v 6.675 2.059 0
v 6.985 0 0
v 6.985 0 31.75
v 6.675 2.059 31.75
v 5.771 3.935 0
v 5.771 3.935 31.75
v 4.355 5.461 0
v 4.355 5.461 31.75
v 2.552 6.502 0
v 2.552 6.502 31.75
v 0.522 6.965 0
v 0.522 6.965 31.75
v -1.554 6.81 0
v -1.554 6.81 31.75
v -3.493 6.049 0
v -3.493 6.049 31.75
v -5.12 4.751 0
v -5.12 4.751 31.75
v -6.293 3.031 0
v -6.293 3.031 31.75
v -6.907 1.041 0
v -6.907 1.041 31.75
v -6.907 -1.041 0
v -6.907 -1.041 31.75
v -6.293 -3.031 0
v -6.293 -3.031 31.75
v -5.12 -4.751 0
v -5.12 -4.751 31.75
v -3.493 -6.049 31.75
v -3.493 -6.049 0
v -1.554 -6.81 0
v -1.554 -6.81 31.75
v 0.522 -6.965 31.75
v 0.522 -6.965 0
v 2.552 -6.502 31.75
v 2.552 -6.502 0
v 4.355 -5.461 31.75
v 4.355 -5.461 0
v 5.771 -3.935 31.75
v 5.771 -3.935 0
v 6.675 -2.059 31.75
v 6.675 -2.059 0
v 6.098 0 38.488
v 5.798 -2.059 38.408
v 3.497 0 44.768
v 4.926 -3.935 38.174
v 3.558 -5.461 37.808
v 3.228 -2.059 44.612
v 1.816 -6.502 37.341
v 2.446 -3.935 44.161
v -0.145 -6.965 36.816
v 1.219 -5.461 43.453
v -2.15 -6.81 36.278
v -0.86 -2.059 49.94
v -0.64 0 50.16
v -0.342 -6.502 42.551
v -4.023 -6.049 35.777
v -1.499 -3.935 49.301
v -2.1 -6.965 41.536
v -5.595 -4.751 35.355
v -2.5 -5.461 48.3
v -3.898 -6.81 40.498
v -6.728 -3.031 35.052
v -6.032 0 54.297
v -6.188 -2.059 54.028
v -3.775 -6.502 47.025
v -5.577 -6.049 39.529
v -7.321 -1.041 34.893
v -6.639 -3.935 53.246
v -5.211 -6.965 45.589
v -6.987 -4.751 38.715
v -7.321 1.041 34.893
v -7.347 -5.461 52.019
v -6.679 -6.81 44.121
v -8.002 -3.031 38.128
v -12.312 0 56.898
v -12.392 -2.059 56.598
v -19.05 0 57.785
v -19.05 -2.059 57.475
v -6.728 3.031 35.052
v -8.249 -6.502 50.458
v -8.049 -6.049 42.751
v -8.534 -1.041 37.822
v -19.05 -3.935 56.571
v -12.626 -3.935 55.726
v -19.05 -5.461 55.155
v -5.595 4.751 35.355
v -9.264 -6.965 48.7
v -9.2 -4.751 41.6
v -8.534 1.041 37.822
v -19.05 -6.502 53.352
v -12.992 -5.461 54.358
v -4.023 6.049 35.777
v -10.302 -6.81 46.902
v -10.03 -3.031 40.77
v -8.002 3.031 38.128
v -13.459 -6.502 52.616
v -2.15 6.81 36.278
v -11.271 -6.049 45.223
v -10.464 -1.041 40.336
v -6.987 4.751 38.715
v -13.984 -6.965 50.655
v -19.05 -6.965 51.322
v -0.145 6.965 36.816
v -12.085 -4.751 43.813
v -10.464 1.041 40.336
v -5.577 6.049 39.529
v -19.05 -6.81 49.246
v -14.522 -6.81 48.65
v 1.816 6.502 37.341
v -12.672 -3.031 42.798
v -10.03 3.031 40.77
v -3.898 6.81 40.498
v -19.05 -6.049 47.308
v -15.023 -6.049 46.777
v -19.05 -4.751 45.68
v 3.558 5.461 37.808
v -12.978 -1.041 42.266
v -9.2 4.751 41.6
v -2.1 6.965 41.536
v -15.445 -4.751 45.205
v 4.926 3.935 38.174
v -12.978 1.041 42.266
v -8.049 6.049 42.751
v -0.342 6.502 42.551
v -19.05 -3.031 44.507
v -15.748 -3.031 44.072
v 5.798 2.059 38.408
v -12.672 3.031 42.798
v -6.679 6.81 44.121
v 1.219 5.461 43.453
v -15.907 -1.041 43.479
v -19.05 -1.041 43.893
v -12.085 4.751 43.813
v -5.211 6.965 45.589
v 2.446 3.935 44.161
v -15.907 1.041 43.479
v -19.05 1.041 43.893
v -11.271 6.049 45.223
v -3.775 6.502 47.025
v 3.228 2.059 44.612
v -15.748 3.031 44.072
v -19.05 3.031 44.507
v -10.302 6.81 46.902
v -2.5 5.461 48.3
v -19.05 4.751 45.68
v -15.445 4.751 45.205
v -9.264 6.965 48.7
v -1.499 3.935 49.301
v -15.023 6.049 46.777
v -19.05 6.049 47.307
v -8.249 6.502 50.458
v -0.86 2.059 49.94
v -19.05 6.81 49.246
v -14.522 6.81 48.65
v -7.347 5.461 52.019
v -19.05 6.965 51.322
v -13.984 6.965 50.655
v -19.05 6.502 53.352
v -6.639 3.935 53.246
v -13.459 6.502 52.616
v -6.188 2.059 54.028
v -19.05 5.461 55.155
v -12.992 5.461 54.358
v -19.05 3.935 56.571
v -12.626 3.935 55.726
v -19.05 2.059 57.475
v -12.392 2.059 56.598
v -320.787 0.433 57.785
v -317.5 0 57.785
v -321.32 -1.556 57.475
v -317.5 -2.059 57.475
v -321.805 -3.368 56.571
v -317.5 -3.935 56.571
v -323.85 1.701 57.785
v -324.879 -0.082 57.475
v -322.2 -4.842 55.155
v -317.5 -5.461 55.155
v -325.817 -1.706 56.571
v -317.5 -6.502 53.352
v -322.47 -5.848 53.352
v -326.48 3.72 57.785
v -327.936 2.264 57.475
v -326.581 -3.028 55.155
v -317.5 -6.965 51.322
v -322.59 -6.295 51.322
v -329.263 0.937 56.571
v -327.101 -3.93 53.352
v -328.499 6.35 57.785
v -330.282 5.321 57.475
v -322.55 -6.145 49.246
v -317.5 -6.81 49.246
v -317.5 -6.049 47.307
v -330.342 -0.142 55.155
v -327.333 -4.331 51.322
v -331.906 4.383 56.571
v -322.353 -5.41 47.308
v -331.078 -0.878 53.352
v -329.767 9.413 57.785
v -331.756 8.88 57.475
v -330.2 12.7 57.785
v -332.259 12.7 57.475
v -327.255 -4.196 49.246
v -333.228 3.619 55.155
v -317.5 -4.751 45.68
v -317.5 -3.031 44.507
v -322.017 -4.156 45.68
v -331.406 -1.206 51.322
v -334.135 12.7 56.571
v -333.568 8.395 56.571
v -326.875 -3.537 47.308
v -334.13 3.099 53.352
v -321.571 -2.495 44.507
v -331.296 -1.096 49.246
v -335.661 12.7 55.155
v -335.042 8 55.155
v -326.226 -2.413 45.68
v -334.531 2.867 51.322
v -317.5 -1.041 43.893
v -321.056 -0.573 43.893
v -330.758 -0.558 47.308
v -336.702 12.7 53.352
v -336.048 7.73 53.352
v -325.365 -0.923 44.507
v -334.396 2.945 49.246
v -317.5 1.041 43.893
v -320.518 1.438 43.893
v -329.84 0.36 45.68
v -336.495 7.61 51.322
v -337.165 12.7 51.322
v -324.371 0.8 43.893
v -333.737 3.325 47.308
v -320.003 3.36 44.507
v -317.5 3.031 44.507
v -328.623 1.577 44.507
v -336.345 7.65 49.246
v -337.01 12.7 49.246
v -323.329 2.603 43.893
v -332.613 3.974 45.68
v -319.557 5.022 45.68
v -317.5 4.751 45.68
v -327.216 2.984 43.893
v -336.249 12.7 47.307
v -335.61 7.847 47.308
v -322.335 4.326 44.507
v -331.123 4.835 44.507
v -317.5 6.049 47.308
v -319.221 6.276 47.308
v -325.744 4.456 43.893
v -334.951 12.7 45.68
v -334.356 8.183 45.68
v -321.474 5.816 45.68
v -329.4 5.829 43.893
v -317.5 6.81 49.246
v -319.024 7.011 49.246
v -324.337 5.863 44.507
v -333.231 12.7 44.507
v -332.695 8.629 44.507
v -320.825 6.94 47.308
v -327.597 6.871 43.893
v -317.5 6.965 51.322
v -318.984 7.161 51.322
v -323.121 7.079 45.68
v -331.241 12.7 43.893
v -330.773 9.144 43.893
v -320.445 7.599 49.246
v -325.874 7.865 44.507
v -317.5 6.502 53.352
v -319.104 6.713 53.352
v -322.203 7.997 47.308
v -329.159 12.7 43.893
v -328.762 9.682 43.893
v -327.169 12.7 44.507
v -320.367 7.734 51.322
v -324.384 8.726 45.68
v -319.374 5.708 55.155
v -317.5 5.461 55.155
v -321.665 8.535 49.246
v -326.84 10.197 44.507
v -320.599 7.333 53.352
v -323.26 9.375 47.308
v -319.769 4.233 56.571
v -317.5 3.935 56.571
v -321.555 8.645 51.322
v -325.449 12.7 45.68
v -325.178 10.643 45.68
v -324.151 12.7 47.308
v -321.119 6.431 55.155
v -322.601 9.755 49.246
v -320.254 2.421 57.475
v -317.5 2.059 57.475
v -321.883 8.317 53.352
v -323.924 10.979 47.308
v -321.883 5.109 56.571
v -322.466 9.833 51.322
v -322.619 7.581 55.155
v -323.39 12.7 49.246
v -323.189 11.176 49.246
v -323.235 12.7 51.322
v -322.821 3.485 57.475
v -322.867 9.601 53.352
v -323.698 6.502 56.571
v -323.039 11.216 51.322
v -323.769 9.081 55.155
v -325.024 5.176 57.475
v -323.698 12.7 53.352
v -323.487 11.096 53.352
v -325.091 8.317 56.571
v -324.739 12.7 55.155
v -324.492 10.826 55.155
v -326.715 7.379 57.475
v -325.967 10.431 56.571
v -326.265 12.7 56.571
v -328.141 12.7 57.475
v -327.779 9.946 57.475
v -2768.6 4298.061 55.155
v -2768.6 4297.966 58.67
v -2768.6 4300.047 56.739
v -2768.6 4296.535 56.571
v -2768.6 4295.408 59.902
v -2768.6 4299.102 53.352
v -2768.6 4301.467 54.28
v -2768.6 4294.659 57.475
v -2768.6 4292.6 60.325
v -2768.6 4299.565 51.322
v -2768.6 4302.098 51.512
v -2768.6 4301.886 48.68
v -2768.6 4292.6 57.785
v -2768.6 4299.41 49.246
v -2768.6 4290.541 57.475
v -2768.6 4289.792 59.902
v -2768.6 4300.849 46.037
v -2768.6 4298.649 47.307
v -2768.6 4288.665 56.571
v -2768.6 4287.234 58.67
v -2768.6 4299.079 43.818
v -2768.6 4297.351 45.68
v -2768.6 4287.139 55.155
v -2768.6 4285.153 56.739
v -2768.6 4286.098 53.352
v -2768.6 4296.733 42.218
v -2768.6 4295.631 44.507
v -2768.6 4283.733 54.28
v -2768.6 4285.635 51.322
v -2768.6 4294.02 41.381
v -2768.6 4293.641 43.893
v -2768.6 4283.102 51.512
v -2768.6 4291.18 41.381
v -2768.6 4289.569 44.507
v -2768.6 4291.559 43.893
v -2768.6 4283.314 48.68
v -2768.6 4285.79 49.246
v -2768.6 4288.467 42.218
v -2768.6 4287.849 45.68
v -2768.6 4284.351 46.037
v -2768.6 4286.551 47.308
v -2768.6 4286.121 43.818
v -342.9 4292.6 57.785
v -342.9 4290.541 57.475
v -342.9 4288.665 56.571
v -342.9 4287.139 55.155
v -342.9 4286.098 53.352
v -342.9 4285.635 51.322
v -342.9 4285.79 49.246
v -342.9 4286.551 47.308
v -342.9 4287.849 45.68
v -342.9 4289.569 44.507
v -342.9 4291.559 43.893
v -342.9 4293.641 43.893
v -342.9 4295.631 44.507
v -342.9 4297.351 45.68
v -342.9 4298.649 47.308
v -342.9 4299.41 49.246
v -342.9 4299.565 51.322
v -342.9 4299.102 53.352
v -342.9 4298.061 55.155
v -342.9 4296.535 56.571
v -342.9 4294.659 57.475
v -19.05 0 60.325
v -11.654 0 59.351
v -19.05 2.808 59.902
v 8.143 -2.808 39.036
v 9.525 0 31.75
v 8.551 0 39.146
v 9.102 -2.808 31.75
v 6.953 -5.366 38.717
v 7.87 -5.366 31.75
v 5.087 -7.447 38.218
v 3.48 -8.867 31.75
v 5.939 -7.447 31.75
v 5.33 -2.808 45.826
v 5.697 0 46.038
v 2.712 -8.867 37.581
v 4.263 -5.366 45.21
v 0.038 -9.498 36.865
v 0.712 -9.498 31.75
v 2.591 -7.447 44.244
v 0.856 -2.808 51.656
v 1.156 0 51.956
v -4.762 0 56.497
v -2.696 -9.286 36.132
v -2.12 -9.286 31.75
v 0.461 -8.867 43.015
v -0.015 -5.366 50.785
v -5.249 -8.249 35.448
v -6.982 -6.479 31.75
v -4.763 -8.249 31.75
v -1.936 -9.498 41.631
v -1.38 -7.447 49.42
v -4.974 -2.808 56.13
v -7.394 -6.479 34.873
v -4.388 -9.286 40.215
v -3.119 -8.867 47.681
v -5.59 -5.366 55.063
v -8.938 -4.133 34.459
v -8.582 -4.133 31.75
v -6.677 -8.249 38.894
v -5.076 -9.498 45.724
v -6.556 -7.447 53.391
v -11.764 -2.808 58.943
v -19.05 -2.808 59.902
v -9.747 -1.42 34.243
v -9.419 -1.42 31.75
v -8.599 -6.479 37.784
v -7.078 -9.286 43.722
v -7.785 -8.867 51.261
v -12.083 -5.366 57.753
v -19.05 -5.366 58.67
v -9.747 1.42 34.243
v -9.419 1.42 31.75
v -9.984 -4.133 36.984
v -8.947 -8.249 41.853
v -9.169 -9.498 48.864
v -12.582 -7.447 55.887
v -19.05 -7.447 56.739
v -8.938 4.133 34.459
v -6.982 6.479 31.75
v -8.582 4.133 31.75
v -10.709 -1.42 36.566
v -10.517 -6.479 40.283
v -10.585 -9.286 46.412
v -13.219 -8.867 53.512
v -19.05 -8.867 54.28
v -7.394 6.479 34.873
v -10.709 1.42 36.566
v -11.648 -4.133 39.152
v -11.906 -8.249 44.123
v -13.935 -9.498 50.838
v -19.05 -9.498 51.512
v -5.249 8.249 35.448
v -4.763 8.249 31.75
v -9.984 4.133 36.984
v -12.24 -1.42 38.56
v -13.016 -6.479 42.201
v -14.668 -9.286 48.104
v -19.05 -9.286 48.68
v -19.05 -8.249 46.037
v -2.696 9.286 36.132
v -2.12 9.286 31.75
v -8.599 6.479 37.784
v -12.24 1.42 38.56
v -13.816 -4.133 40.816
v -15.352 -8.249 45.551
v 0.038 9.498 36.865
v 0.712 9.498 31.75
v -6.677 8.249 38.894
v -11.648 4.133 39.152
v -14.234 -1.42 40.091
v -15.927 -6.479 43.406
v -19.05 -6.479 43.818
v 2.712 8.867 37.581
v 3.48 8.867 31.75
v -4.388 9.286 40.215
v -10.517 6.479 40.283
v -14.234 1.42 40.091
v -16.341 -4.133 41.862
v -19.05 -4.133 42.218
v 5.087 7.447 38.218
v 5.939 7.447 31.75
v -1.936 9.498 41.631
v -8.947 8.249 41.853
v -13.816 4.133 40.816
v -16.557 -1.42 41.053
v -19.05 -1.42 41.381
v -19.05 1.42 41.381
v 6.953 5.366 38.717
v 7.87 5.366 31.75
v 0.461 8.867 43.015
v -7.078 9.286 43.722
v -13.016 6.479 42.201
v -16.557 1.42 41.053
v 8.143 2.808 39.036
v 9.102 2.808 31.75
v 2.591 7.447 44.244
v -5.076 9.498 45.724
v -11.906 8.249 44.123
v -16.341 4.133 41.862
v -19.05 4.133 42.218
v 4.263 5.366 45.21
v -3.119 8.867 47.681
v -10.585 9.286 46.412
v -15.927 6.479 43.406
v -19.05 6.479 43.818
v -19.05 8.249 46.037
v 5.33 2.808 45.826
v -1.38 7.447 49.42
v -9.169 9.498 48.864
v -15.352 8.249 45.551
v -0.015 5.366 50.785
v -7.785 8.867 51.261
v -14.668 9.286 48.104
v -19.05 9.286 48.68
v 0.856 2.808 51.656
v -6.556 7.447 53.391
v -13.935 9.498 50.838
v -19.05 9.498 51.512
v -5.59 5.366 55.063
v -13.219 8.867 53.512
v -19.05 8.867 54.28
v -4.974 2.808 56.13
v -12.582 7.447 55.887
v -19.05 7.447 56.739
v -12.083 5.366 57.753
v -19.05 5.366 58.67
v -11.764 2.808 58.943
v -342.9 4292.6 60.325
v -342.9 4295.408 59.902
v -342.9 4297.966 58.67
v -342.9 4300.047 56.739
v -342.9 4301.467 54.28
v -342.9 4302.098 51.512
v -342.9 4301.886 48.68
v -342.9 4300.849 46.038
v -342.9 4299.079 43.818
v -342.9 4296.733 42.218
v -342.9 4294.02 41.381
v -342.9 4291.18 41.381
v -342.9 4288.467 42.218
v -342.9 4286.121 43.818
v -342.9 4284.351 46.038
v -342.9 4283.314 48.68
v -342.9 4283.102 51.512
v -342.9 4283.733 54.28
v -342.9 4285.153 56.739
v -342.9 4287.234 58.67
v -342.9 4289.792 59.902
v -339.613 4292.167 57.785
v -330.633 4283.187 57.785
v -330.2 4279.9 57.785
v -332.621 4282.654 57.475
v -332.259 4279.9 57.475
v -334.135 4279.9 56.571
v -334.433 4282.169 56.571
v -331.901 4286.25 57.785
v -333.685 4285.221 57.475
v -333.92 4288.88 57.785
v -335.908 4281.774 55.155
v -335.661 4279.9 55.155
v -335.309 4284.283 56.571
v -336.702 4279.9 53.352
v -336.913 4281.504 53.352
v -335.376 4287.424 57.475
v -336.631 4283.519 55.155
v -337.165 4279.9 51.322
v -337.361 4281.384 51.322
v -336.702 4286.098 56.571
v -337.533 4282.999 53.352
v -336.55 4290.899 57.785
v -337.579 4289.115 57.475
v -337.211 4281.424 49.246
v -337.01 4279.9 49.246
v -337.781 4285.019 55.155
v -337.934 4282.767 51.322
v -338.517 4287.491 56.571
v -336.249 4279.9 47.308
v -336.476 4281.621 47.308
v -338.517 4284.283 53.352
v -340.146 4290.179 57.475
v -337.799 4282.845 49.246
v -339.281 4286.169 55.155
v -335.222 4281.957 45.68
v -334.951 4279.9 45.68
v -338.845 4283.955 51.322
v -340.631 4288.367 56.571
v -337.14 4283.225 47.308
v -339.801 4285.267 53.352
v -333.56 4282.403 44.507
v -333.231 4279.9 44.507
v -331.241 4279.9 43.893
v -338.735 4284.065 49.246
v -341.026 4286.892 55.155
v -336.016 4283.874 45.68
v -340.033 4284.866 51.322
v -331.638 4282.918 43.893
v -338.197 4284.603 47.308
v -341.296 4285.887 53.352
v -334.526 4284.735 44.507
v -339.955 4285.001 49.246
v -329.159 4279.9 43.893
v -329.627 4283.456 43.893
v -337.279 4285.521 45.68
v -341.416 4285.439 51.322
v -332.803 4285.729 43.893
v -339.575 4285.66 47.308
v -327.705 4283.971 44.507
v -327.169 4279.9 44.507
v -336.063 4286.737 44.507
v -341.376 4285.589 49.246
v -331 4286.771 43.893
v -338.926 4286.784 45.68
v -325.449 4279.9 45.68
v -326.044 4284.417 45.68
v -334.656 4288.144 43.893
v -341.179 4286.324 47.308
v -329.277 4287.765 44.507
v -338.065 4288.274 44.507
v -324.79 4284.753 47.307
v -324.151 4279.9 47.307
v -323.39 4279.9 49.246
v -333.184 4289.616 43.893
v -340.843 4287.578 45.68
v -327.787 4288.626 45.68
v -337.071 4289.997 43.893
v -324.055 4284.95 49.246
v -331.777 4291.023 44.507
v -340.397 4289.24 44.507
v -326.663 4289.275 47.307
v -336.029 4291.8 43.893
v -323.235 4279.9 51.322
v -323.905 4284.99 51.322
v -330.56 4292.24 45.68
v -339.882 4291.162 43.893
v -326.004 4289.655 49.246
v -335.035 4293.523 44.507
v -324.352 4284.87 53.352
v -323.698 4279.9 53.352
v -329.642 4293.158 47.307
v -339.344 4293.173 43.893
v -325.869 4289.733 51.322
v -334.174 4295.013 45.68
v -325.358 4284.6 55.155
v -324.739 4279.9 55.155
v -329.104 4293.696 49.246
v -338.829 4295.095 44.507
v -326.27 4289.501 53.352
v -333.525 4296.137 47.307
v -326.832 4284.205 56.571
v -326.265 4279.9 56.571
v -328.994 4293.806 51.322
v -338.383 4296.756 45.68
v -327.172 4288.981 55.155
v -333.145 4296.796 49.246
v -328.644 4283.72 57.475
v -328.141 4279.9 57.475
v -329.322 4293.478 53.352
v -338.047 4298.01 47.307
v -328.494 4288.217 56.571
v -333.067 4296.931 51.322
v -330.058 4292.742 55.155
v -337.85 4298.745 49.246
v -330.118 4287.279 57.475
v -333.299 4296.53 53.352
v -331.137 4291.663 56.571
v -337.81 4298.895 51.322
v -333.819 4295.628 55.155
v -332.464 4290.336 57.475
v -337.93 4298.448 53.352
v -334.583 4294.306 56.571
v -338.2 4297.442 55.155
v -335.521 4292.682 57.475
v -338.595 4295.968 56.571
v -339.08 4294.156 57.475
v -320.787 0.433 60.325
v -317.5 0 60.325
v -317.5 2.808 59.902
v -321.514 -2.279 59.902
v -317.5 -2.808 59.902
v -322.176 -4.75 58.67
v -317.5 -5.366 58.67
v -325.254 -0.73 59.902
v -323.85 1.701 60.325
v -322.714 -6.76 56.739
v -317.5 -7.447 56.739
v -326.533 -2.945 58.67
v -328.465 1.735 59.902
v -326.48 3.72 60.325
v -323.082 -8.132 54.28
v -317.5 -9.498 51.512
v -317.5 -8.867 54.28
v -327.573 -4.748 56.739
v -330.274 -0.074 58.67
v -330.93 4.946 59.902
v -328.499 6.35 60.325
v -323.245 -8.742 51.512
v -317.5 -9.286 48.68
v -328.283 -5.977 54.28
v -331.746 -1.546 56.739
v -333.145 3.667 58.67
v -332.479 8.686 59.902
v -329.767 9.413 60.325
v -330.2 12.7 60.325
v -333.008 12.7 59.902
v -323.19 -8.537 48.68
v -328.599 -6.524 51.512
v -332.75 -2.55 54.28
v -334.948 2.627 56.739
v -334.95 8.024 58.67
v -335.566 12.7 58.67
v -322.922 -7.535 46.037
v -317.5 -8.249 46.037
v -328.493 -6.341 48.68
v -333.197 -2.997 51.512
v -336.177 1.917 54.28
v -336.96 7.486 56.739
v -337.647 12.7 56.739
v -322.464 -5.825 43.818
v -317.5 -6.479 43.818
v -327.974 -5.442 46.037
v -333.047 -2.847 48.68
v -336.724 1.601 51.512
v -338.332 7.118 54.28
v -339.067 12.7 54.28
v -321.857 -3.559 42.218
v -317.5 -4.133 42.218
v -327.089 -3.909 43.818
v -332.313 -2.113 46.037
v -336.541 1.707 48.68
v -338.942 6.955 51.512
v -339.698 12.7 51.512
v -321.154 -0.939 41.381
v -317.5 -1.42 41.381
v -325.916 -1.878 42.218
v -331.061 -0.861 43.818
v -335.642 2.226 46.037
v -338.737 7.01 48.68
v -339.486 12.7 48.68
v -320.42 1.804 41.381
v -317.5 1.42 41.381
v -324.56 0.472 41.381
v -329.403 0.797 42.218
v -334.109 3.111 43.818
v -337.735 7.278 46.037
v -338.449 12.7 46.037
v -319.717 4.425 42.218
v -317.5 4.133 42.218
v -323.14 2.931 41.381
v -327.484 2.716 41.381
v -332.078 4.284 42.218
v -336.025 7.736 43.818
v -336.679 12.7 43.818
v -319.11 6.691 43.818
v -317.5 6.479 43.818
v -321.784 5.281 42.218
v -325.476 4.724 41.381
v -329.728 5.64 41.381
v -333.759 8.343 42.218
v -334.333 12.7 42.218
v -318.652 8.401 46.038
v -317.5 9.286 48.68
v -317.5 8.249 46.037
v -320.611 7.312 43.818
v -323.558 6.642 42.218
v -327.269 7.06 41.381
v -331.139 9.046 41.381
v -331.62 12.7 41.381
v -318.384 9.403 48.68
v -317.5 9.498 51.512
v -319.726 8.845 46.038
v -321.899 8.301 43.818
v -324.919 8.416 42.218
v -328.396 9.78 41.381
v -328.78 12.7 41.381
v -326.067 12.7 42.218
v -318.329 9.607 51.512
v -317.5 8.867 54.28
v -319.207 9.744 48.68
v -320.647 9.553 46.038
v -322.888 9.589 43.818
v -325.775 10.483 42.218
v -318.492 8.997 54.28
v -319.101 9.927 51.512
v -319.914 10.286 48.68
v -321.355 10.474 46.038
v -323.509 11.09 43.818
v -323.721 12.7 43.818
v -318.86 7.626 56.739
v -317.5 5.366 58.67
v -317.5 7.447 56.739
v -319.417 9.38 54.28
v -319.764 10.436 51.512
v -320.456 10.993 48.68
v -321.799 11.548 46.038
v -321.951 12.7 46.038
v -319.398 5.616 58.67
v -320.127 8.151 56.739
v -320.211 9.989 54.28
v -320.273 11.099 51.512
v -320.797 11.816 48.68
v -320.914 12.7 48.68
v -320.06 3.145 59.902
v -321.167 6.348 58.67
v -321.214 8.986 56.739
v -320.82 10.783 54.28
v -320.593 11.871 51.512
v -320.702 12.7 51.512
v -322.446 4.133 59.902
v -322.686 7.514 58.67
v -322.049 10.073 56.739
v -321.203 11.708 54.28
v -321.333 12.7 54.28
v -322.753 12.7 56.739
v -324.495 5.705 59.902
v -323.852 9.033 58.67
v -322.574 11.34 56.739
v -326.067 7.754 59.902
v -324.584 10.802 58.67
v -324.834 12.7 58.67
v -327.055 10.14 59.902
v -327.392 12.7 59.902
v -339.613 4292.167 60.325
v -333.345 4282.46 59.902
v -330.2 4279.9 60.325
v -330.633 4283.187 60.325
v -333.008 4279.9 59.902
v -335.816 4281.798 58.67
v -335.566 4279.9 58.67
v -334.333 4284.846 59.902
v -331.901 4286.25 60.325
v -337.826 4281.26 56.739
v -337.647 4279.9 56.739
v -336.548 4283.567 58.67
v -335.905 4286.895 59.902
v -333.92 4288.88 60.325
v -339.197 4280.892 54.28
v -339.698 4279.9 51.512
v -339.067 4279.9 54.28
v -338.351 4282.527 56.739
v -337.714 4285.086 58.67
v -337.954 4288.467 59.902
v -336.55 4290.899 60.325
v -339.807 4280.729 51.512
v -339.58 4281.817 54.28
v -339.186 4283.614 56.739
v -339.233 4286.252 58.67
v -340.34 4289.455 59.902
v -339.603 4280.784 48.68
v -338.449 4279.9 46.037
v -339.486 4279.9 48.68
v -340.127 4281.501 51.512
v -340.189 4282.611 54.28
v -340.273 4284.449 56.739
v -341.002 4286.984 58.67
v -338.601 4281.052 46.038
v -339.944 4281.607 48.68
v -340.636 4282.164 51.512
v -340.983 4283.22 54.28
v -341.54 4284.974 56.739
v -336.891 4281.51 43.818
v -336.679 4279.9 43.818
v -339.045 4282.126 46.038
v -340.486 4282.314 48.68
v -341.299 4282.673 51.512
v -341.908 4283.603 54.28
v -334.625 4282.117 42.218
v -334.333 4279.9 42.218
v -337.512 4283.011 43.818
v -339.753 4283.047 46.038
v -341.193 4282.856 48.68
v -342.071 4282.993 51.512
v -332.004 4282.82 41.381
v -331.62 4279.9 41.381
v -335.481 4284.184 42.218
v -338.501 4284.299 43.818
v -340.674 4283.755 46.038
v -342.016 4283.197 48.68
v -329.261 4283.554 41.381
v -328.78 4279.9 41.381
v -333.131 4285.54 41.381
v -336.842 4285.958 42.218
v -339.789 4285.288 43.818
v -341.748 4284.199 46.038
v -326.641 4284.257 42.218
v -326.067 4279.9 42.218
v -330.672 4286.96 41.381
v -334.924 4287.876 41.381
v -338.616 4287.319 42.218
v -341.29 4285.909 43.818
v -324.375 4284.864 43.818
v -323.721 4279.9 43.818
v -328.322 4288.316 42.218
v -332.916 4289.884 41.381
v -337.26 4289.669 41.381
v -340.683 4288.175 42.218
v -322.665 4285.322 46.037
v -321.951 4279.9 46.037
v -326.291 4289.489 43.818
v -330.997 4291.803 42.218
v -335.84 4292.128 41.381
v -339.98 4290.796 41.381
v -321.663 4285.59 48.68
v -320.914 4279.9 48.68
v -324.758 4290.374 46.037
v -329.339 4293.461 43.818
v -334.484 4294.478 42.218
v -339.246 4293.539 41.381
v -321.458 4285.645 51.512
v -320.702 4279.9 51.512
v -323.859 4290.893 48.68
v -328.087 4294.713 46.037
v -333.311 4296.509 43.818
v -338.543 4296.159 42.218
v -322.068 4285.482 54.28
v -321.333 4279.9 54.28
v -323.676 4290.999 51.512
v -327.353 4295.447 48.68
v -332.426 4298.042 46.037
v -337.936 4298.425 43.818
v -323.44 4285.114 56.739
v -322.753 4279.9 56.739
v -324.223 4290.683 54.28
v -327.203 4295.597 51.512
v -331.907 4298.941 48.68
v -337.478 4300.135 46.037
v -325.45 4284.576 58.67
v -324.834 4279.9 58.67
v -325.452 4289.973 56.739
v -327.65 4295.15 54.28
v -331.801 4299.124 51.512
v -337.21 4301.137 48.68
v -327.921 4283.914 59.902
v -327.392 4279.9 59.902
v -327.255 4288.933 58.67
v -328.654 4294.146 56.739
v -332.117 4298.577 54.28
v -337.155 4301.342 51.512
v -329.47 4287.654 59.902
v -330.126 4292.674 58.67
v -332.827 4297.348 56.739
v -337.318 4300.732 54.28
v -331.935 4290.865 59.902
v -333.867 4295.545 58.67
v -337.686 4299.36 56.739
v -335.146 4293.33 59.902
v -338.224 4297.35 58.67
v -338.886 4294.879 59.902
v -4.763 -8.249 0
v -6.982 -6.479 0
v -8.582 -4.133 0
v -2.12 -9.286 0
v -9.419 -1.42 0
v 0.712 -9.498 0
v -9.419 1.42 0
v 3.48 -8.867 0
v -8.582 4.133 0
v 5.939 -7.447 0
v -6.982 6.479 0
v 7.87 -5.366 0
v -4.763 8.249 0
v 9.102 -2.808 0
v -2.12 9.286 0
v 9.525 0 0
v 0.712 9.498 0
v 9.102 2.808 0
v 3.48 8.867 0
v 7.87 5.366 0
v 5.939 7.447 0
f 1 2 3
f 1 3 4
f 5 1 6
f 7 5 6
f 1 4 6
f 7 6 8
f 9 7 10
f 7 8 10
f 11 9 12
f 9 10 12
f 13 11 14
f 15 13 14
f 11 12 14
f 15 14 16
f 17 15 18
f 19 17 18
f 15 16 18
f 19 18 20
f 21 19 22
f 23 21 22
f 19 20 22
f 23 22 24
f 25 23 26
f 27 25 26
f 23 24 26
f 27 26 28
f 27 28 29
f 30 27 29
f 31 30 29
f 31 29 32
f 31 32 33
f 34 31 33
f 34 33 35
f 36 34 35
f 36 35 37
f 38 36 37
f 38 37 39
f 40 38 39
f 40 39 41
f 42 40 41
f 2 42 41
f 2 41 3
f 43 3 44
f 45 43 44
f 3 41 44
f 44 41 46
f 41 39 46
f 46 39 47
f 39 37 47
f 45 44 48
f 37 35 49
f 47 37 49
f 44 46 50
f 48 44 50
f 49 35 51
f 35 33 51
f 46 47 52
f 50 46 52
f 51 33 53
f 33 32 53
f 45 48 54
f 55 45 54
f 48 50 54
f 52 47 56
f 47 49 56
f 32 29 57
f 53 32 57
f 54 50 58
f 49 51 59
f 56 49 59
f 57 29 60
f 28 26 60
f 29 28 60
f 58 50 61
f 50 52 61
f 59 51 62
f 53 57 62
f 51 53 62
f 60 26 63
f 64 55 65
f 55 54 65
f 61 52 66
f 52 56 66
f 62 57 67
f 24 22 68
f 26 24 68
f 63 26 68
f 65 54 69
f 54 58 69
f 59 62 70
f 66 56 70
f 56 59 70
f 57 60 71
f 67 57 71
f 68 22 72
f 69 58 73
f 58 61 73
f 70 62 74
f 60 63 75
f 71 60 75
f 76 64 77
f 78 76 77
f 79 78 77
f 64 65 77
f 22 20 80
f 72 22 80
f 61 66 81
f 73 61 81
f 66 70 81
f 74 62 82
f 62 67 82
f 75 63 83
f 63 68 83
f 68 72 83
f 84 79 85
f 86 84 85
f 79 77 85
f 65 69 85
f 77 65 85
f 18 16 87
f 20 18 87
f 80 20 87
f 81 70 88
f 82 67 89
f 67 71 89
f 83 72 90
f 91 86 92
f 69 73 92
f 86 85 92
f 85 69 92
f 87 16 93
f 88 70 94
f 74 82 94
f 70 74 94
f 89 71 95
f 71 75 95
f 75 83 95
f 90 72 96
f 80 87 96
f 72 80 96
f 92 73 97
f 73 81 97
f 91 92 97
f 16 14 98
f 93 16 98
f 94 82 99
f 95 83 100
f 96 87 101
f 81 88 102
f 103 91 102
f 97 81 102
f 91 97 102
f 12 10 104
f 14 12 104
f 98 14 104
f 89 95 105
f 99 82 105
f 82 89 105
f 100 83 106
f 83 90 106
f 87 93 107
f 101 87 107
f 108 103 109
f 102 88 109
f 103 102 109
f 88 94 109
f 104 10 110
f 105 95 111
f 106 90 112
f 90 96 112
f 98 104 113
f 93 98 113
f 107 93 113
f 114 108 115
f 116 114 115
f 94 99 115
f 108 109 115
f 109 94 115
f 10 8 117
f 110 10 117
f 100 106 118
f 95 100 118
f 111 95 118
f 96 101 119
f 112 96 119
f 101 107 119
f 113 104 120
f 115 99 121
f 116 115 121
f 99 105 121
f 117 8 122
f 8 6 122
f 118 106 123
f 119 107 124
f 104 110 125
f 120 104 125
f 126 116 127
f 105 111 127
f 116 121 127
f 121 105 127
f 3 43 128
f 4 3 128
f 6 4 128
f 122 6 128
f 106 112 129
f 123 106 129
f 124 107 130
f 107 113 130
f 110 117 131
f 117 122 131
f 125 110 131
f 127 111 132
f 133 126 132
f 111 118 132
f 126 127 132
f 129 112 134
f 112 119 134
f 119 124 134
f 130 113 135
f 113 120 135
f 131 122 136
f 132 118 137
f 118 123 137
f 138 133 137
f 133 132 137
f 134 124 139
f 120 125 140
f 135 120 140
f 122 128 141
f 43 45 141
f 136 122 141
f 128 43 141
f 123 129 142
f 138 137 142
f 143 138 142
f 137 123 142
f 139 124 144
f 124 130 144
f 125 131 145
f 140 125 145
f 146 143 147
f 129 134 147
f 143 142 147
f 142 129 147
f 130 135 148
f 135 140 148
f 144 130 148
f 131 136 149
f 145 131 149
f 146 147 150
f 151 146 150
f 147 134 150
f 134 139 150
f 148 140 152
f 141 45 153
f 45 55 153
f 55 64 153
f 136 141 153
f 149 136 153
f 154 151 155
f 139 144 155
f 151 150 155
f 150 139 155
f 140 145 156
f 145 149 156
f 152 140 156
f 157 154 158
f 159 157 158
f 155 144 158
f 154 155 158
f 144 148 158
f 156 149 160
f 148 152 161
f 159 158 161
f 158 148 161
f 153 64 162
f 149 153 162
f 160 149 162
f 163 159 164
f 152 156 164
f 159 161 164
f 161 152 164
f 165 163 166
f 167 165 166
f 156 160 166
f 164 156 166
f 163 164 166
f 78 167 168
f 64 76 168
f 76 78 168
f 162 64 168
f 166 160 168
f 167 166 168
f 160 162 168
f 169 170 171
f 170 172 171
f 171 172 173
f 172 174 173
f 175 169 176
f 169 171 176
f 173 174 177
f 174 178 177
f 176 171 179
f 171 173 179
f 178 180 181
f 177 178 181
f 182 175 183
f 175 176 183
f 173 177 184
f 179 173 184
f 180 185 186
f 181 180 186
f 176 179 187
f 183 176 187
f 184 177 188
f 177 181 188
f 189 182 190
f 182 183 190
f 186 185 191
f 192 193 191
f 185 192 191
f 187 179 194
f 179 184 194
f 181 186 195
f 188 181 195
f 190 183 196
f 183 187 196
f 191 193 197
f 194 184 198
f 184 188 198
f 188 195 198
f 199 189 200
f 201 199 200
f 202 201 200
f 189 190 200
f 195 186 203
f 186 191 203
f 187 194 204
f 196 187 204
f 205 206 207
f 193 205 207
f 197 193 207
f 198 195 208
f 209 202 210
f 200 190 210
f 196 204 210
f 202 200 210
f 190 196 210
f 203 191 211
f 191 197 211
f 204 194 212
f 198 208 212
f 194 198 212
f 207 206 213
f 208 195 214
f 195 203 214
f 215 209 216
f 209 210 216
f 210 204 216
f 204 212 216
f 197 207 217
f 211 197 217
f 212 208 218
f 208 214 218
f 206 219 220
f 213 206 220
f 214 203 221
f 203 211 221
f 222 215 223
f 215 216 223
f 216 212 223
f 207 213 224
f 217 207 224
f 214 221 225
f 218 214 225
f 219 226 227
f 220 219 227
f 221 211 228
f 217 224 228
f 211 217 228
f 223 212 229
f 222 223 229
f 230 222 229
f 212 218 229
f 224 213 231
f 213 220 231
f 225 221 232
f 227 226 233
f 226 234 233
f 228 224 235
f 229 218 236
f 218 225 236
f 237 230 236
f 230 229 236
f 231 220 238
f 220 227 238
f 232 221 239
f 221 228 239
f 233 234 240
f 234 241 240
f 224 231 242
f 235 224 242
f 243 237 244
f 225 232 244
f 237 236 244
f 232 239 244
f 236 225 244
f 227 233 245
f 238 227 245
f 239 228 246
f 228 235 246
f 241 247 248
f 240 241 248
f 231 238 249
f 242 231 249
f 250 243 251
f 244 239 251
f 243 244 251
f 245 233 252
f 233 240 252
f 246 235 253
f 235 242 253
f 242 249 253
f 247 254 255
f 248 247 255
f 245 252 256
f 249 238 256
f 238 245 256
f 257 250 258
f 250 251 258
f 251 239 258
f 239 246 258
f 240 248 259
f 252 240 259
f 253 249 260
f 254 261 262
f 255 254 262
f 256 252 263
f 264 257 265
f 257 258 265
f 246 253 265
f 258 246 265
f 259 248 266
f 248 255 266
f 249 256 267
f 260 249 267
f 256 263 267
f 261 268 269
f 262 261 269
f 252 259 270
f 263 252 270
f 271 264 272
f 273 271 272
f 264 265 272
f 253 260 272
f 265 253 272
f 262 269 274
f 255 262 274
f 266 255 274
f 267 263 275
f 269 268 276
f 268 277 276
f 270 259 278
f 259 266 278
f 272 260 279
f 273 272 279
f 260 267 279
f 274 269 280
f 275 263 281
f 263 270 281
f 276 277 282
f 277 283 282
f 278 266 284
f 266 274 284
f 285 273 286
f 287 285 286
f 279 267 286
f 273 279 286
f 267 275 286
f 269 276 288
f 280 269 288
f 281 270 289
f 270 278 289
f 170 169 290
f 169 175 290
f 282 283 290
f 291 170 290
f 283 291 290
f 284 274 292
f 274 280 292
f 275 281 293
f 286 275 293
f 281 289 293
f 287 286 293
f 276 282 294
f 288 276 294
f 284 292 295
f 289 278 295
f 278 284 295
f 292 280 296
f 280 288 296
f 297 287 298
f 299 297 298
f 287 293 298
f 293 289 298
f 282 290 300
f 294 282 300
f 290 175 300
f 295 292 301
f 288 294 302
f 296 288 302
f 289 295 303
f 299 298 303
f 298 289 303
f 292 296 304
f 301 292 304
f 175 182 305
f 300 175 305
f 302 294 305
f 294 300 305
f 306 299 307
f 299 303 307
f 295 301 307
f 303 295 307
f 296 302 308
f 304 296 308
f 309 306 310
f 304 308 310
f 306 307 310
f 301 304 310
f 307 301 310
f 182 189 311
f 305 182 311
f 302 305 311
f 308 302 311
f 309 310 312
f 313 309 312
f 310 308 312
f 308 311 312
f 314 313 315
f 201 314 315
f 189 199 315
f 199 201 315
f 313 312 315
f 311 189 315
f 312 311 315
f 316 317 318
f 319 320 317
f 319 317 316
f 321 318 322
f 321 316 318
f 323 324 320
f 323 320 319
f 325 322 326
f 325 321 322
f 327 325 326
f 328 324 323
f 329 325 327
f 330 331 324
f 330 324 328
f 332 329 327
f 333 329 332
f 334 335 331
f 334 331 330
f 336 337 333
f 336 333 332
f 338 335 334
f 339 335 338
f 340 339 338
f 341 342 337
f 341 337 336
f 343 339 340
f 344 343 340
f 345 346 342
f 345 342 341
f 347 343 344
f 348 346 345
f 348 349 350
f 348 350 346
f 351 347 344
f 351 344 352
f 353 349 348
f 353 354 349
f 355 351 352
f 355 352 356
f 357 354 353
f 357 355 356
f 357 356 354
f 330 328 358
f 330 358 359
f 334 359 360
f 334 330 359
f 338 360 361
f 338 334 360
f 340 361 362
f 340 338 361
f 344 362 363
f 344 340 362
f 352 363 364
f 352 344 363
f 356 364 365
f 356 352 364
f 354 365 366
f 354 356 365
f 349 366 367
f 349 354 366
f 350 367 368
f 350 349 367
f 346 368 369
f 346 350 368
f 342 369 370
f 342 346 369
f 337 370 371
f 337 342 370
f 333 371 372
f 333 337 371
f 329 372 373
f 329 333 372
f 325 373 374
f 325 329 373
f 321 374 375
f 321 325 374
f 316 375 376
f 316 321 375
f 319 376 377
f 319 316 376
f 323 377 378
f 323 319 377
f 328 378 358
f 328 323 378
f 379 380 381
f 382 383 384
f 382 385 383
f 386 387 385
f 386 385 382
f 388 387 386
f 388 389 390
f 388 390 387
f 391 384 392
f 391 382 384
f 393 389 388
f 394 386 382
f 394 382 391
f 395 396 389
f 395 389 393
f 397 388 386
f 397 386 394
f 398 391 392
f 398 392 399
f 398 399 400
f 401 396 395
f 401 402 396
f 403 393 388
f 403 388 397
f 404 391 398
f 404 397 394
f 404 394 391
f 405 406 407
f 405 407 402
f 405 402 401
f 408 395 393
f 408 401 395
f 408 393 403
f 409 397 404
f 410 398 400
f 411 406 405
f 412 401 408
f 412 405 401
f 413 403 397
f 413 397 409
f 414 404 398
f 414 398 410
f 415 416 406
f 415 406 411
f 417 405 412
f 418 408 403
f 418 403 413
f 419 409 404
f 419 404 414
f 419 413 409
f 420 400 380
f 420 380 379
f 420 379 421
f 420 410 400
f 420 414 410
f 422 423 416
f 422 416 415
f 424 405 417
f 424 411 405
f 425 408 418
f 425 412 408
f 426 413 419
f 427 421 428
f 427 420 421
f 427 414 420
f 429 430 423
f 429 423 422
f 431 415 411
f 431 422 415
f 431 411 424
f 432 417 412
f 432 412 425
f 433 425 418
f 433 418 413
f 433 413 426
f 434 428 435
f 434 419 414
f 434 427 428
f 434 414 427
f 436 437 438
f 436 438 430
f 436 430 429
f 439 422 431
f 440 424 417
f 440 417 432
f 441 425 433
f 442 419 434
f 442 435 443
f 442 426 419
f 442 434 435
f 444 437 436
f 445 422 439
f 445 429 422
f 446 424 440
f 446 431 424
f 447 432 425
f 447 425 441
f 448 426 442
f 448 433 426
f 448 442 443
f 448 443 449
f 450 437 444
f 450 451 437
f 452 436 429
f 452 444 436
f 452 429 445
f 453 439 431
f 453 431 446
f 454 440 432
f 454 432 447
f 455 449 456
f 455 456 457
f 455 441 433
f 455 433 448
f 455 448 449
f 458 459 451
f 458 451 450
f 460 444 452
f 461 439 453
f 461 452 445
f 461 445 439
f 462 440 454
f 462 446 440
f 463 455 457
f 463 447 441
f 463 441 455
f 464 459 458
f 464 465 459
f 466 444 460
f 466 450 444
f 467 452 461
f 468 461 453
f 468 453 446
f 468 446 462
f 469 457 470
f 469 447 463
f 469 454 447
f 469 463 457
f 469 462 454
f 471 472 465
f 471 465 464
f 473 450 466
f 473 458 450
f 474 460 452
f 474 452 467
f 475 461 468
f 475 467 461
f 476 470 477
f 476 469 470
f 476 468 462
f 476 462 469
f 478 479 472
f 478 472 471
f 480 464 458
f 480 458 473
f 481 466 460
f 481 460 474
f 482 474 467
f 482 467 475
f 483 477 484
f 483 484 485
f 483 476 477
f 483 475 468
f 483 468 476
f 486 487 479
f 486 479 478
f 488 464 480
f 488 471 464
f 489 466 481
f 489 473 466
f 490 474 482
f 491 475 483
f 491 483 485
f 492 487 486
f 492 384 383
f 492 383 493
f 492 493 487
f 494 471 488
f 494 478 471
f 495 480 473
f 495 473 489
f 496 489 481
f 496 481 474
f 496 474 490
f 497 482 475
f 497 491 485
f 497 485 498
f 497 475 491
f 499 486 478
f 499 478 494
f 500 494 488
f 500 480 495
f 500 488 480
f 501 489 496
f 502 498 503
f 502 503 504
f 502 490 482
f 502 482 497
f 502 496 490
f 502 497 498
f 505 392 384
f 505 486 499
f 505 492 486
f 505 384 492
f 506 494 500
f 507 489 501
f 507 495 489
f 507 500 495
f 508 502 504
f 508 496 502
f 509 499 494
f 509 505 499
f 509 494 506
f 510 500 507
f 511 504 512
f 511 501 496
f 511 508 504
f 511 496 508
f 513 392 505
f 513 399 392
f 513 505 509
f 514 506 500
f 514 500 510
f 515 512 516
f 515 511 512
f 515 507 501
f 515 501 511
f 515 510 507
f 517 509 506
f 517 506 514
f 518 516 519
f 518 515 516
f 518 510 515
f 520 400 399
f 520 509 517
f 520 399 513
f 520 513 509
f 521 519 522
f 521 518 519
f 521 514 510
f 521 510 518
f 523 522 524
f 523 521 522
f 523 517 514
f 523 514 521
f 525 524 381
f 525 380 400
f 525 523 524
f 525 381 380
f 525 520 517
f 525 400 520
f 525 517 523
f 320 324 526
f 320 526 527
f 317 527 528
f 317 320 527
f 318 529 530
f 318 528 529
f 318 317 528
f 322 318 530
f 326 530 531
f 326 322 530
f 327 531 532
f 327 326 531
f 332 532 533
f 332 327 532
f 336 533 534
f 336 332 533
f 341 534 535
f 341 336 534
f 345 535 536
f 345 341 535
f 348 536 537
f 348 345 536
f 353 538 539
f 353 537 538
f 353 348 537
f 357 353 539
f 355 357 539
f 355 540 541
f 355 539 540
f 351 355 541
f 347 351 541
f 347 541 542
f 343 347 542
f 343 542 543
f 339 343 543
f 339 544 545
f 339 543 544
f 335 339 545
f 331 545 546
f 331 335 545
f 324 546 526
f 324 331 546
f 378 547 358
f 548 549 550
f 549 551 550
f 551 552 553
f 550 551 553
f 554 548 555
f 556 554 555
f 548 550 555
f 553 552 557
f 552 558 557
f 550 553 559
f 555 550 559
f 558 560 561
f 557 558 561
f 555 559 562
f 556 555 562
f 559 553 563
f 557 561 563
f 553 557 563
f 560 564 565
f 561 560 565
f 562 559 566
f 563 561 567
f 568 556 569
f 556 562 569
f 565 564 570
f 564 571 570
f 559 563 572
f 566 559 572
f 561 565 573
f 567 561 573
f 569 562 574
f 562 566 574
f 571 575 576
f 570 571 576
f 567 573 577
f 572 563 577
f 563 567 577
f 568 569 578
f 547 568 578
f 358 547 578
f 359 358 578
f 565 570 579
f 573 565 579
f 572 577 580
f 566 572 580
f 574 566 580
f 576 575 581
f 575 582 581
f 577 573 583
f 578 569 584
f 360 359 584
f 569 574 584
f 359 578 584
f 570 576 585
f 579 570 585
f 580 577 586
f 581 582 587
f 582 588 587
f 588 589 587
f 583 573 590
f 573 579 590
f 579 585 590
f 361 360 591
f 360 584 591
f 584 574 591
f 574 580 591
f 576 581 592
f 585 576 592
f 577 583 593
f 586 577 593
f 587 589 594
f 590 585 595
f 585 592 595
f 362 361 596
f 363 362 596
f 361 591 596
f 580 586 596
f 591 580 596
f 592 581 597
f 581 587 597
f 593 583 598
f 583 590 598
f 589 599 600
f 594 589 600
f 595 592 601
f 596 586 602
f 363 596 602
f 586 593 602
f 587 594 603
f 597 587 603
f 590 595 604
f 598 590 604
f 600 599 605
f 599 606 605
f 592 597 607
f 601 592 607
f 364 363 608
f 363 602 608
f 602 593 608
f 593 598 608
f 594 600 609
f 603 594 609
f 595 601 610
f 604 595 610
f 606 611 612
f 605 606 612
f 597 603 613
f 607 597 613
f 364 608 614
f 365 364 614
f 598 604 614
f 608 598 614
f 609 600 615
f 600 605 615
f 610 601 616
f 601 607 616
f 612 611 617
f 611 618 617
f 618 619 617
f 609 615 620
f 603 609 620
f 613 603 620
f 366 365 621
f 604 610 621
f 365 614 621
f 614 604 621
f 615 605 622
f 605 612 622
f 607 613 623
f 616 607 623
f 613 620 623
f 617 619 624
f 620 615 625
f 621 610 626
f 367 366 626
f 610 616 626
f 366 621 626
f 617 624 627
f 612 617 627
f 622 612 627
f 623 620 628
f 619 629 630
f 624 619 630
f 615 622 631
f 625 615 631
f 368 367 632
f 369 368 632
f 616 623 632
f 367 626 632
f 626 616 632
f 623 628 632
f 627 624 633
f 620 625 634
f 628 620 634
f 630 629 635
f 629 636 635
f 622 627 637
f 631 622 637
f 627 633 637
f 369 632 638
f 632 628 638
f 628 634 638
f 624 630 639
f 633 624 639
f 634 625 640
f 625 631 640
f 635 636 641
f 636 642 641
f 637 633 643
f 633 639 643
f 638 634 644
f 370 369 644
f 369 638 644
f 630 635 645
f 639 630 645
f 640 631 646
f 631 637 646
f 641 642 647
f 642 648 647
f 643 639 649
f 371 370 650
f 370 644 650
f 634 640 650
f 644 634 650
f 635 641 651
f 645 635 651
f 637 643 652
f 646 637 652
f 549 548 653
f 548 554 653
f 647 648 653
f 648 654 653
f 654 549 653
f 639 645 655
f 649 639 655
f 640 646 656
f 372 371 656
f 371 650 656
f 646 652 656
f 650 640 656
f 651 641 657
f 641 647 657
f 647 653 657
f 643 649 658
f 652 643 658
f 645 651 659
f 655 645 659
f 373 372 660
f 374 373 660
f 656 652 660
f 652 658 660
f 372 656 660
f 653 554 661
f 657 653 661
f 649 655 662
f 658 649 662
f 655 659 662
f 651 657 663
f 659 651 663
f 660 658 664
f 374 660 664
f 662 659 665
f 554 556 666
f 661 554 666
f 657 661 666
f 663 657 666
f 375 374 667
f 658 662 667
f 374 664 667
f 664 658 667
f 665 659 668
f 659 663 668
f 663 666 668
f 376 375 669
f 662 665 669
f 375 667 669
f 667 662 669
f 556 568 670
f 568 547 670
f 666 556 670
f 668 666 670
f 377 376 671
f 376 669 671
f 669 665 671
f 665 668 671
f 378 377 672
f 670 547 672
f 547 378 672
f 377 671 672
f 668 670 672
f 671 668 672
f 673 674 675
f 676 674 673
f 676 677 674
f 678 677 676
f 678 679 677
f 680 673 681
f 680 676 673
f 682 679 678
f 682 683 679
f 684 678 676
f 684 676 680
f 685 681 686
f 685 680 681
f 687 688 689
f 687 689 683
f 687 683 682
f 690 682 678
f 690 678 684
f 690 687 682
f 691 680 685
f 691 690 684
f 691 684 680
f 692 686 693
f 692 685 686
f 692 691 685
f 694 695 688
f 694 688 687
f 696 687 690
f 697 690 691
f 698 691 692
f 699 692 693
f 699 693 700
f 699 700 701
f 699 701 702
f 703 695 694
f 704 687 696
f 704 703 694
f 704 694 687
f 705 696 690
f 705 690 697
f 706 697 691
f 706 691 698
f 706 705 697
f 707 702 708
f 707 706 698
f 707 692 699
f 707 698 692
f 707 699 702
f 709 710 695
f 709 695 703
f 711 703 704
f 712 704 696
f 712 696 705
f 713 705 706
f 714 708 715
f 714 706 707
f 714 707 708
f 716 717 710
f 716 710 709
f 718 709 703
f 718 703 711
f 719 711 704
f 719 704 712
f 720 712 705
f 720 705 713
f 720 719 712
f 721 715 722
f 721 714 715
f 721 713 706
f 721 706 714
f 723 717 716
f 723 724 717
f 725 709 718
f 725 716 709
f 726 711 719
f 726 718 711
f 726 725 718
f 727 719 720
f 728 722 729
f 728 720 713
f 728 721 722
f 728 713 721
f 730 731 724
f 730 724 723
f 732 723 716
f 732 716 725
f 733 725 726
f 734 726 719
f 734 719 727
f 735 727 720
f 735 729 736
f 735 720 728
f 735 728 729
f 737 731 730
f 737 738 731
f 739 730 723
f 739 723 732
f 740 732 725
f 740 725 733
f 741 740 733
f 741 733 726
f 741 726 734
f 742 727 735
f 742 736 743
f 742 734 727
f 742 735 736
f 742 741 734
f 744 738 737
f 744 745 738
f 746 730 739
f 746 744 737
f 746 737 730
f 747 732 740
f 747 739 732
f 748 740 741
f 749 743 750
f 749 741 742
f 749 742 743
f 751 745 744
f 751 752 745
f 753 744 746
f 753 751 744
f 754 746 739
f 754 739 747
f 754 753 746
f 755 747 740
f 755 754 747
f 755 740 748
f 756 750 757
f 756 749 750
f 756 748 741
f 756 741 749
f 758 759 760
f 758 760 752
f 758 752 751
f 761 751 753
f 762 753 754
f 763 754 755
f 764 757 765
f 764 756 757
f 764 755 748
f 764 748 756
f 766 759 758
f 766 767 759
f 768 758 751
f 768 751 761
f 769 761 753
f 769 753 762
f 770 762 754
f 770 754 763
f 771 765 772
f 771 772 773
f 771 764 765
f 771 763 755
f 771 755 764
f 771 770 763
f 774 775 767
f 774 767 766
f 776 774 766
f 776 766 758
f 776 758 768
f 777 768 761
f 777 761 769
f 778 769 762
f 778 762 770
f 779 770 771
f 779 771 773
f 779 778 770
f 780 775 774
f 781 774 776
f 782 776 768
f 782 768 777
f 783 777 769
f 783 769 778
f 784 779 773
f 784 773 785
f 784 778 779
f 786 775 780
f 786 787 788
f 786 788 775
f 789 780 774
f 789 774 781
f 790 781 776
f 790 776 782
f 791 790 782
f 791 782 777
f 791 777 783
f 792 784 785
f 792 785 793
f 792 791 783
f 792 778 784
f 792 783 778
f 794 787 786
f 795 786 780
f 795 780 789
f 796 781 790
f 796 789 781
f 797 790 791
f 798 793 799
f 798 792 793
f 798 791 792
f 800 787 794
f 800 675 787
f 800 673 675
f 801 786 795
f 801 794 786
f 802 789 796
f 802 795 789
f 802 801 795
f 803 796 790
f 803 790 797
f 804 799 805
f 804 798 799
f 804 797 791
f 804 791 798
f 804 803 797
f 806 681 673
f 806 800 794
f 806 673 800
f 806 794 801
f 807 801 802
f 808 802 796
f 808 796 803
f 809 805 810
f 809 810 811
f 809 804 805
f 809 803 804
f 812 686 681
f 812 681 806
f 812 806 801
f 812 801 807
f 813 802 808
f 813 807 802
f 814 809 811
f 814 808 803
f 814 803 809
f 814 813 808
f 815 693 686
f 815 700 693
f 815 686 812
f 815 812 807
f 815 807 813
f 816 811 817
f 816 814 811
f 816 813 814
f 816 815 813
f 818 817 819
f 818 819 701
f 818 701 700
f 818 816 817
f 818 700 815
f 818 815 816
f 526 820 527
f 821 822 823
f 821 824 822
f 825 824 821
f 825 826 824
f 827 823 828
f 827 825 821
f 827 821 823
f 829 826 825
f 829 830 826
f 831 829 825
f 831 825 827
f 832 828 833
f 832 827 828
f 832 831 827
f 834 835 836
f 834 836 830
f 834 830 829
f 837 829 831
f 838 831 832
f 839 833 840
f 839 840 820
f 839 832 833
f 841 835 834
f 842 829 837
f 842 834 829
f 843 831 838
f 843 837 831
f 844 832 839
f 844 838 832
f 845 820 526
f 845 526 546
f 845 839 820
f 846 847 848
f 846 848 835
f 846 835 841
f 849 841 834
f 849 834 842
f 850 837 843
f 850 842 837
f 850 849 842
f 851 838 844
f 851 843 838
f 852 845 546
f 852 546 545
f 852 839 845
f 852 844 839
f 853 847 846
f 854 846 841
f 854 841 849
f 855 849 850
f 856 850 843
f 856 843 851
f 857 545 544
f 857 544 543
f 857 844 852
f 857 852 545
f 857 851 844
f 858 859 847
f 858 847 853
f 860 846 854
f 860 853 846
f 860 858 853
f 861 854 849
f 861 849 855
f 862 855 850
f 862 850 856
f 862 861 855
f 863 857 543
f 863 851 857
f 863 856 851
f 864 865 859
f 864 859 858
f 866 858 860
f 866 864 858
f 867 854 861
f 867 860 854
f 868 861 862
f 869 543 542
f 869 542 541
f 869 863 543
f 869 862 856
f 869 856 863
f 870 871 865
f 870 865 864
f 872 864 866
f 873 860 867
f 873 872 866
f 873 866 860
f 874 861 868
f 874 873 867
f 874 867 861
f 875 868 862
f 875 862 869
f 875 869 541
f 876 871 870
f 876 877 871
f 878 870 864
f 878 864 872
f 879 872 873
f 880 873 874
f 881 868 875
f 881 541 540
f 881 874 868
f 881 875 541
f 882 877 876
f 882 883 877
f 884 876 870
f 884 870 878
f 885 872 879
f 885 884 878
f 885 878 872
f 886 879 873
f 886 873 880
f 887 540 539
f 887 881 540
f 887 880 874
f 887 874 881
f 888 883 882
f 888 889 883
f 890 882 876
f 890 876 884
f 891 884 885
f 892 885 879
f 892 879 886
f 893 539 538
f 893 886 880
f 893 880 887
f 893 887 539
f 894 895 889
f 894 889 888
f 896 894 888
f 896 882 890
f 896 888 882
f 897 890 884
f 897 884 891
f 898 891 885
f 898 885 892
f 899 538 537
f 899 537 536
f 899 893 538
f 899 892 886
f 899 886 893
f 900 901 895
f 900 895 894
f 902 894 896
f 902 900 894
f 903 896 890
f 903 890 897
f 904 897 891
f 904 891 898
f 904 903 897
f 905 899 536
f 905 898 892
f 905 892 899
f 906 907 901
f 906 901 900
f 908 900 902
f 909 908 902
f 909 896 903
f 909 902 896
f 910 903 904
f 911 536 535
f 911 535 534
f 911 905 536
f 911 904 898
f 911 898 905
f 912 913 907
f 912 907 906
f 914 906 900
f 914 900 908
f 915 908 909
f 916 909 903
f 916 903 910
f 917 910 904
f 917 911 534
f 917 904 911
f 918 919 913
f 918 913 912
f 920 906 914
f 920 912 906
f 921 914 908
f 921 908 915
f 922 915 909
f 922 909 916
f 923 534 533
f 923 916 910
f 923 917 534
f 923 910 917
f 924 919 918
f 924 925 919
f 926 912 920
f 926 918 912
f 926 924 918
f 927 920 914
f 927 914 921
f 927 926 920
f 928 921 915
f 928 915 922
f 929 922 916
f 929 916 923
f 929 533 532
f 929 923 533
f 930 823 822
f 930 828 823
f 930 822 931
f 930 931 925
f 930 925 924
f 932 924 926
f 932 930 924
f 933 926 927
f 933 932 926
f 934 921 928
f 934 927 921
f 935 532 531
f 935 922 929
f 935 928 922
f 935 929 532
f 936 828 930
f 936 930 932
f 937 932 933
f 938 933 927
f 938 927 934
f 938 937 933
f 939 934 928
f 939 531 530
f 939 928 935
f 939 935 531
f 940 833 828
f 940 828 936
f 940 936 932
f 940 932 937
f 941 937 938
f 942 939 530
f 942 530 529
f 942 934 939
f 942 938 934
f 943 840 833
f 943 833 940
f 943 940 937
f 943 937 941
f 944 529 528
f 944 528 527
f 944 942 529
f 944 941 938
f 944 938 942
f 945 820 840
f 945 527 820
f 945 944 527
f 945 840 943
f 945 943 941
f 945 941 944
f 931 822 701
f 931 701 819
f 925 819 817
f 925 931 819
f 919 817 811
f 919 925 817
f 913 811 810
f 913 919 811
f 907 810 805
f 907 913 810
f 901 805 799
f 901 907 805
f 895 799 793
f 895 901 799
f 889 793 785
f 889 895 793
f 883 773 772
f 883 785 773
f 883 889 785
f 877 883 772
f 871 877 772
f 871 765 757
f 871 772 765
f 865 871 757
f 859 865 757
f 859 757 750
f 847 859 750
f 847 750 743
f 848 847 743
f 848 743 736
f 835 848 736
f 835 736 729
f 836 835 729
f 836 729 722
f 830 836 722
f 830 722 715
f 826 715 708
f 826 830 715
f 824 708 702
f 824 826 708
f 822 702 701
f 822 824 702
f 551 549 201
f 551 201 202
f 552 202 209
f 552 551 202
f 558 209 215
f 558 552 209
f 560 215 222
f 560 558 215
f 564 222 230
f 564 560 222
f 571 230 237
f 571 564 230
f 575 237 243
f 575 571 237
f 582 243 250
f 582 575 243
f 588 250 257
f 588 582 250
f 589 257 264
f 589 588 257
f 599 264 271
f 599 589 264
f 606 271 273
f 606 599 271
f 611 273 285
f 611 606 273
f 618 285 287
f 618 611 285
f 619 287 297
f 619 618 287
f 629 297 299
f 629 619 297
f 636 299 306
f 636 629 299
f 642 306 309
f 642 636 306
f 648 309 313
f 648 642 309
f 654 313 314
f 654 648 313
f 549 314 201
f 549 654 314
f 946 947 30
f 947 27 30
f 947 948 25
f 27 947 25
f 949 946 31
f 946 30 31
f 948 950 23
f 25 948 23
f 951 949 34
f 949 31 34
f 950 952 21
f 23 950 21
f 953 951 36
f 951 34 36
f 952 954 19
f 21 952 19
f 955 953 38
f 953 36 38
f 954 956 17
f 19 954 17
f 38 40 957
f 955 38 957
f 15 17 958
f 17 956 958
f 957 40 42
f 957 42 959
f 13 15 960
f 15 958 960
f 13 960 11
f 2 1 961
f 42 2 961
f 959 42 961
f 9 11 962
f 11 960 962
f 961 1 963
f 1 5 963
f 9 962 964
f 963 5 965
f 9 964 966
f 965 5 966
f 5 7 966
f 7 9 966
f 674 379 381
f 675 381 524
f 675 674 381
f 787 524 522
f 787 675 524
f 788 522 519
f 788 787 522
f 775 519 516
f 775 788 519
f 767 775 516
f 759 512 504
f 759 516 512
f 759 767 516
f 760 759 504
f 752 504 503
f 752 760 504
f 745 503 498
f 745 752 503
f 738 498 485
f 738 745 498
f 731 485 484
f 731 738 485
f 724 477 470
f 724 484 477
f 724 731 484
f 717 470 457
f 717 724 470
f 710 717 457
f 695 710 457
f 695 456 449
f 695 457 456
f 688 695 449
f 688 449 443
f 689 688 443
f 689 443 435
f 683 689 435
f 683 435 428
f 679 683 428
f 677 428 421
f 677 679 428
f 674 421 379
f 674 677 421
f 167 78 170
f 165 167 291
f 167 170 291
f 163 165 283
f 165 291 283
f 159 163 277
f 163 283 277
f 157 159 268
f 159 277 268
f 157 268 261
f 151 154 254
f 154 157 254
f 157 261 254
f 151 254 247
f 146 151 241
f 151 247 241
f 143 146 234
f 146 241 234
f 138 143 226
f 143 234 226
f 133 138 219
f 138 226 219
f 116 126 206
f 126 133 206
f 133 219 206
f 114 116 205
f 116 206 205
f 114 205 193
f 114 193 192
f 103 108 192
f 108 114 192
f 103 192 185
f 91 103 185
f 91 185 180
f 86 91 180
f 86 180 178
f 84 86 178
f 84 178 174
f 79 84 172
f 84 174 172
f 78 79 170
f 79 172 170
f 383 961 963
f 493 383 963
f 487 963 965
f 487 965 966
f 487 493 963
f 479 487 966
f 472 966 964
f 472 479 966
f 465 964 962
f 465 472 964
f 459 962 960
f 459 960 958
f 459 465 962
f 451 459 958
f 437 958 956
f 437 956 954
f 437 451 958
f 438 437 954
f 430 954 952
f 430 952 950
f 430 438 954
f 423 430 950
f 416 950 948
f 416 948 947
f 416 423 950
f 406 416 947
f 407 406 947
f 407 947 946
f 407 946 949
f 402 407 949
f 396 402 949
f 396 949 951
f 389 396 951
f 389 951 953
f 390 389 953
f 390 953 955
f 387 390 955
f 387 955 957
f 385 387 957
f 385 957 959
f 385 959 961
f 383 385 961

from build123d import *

# Parameters (mm, degrees)
SKETCH1_R   = 9.525
SKETCH1_R_2 = 6.985


with BuildPart() as part:
    # Sweep1: sweep along a curve in space
    with BuildLine() as sweep1_path:
        Line((0, 0, 0), (0, 0, 31.75))
        ThreePointArc((0, 0, 31.75), (-5.579615818, 0, 45.220384182), (-19.05, 0, 50.8))
        Line((-19.05, 0, 50.8), (-304.8, 0, 50.8))
        Line((-304.8, 0, 50.8), (-317.5, 0, 50.8))
        ThreePointArc((-317.5, 0, 50.8), (-326.480256121, 3.719743879, 50.8), (-330.2, 12.7, 50.8))
        Line((-330.2, 12.7, 50.8), (-330.2, 4279.9, 50.8))
        ThreePointArc((-330.2, 4279.9, 50.8), (-333.919743879, 4288.880256121, 50.8), (-342.9, 4292.6, 50.8))
        Line((-342.9, 4292.6, 50.8), (-2768.6, 4292.6, 50.8))
    # Sketch1 → Sweep1 (sweep)
    with BuildSketch(Plane.XY):
        Circle(SKETCH1_R)
        Circle(SKETCH1_R_2, mode=Mode.SUBTRACT)
    sweep(path=sweep1_path.line)


solid = part.part
